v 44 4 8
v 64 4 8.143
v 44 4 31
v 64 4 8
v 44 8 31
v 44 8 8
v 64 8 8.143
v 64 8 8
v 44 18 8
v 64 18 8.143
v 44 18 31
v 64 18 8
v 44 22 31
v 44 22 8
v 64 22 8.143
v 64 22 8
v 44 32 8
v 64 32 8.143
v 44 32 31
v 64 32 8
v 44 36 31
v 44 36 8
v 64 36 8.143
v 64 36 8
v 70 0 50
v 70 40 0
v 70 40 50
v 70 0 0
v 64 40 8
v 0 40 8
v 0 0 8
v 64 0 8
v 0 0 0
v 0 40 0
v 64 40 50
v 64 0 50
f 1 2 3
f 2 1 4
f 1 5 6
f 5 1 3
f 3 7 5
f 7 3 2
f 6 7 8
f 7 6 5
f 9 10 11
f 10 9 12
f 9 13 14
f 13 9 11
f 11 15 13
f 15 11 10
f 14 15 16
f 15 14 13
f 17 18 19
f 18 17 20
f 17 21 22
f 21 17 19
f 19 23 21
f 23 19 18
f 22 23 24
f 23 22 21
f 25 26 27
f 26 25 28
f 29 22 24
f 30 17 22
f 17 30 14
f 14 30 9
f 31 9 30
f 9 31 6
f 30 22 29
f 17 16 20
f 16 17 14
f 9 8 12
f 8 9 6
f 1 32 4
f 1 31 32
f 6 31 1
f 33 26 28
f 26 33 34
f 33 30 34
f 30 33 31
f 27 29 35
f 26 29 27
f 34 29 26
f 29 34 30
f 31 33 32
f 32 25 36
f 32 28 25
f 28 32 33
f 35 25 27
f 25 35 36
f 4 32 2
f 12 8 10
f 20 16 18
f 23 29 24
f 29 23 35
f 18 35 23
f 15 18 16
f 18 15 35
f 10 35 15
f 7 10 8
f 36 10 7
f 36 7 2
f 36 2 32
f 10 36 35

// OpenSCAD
$fn = 32;

// ----------------------------------------------------------------------
// Rib bracket: 3-gusset L bracket
// ----------------------------------------------------------------------

// --- parameters (mm) ---
base_l = 70;              // foot length, X
base_w = 40;              // foot width, Y
base_t = 8;               // foot thickness
plate_t = 6;              // upright plate thickness
plate_h = 50;             // overall height
gus_l = 20;               // gusset leg along the foot
gus_h = 24;               // gusset height
gus_t = 4;                // gusset thickness
gus_edge = 4;             // gusset margin from the foot edge
n_gus = 3;                // gusset count

gus_pitch = (base_w - 2 * gus_edge - gus_t) / (n_gus - 1);  // gusset pitch

union() {
  cube([base_l, base_w, base_t]);
  translate([base_l - plate_t, 0, base_t - 1])
    cube([plate_t, base_w, plate_h - base_t + 1]);
  for (i = [0 : n_gus - 1])
    translate([base_l - plate_t - gus_l, gus_edge + i * gus_pitch, base_t - 1])
      rotate([-90, 0, 0])
        linear_extrude(height = gus_t)
          polygon(points = [[0, 0], [gus_l + 1, 0], [0, -gus_h]]);
}
